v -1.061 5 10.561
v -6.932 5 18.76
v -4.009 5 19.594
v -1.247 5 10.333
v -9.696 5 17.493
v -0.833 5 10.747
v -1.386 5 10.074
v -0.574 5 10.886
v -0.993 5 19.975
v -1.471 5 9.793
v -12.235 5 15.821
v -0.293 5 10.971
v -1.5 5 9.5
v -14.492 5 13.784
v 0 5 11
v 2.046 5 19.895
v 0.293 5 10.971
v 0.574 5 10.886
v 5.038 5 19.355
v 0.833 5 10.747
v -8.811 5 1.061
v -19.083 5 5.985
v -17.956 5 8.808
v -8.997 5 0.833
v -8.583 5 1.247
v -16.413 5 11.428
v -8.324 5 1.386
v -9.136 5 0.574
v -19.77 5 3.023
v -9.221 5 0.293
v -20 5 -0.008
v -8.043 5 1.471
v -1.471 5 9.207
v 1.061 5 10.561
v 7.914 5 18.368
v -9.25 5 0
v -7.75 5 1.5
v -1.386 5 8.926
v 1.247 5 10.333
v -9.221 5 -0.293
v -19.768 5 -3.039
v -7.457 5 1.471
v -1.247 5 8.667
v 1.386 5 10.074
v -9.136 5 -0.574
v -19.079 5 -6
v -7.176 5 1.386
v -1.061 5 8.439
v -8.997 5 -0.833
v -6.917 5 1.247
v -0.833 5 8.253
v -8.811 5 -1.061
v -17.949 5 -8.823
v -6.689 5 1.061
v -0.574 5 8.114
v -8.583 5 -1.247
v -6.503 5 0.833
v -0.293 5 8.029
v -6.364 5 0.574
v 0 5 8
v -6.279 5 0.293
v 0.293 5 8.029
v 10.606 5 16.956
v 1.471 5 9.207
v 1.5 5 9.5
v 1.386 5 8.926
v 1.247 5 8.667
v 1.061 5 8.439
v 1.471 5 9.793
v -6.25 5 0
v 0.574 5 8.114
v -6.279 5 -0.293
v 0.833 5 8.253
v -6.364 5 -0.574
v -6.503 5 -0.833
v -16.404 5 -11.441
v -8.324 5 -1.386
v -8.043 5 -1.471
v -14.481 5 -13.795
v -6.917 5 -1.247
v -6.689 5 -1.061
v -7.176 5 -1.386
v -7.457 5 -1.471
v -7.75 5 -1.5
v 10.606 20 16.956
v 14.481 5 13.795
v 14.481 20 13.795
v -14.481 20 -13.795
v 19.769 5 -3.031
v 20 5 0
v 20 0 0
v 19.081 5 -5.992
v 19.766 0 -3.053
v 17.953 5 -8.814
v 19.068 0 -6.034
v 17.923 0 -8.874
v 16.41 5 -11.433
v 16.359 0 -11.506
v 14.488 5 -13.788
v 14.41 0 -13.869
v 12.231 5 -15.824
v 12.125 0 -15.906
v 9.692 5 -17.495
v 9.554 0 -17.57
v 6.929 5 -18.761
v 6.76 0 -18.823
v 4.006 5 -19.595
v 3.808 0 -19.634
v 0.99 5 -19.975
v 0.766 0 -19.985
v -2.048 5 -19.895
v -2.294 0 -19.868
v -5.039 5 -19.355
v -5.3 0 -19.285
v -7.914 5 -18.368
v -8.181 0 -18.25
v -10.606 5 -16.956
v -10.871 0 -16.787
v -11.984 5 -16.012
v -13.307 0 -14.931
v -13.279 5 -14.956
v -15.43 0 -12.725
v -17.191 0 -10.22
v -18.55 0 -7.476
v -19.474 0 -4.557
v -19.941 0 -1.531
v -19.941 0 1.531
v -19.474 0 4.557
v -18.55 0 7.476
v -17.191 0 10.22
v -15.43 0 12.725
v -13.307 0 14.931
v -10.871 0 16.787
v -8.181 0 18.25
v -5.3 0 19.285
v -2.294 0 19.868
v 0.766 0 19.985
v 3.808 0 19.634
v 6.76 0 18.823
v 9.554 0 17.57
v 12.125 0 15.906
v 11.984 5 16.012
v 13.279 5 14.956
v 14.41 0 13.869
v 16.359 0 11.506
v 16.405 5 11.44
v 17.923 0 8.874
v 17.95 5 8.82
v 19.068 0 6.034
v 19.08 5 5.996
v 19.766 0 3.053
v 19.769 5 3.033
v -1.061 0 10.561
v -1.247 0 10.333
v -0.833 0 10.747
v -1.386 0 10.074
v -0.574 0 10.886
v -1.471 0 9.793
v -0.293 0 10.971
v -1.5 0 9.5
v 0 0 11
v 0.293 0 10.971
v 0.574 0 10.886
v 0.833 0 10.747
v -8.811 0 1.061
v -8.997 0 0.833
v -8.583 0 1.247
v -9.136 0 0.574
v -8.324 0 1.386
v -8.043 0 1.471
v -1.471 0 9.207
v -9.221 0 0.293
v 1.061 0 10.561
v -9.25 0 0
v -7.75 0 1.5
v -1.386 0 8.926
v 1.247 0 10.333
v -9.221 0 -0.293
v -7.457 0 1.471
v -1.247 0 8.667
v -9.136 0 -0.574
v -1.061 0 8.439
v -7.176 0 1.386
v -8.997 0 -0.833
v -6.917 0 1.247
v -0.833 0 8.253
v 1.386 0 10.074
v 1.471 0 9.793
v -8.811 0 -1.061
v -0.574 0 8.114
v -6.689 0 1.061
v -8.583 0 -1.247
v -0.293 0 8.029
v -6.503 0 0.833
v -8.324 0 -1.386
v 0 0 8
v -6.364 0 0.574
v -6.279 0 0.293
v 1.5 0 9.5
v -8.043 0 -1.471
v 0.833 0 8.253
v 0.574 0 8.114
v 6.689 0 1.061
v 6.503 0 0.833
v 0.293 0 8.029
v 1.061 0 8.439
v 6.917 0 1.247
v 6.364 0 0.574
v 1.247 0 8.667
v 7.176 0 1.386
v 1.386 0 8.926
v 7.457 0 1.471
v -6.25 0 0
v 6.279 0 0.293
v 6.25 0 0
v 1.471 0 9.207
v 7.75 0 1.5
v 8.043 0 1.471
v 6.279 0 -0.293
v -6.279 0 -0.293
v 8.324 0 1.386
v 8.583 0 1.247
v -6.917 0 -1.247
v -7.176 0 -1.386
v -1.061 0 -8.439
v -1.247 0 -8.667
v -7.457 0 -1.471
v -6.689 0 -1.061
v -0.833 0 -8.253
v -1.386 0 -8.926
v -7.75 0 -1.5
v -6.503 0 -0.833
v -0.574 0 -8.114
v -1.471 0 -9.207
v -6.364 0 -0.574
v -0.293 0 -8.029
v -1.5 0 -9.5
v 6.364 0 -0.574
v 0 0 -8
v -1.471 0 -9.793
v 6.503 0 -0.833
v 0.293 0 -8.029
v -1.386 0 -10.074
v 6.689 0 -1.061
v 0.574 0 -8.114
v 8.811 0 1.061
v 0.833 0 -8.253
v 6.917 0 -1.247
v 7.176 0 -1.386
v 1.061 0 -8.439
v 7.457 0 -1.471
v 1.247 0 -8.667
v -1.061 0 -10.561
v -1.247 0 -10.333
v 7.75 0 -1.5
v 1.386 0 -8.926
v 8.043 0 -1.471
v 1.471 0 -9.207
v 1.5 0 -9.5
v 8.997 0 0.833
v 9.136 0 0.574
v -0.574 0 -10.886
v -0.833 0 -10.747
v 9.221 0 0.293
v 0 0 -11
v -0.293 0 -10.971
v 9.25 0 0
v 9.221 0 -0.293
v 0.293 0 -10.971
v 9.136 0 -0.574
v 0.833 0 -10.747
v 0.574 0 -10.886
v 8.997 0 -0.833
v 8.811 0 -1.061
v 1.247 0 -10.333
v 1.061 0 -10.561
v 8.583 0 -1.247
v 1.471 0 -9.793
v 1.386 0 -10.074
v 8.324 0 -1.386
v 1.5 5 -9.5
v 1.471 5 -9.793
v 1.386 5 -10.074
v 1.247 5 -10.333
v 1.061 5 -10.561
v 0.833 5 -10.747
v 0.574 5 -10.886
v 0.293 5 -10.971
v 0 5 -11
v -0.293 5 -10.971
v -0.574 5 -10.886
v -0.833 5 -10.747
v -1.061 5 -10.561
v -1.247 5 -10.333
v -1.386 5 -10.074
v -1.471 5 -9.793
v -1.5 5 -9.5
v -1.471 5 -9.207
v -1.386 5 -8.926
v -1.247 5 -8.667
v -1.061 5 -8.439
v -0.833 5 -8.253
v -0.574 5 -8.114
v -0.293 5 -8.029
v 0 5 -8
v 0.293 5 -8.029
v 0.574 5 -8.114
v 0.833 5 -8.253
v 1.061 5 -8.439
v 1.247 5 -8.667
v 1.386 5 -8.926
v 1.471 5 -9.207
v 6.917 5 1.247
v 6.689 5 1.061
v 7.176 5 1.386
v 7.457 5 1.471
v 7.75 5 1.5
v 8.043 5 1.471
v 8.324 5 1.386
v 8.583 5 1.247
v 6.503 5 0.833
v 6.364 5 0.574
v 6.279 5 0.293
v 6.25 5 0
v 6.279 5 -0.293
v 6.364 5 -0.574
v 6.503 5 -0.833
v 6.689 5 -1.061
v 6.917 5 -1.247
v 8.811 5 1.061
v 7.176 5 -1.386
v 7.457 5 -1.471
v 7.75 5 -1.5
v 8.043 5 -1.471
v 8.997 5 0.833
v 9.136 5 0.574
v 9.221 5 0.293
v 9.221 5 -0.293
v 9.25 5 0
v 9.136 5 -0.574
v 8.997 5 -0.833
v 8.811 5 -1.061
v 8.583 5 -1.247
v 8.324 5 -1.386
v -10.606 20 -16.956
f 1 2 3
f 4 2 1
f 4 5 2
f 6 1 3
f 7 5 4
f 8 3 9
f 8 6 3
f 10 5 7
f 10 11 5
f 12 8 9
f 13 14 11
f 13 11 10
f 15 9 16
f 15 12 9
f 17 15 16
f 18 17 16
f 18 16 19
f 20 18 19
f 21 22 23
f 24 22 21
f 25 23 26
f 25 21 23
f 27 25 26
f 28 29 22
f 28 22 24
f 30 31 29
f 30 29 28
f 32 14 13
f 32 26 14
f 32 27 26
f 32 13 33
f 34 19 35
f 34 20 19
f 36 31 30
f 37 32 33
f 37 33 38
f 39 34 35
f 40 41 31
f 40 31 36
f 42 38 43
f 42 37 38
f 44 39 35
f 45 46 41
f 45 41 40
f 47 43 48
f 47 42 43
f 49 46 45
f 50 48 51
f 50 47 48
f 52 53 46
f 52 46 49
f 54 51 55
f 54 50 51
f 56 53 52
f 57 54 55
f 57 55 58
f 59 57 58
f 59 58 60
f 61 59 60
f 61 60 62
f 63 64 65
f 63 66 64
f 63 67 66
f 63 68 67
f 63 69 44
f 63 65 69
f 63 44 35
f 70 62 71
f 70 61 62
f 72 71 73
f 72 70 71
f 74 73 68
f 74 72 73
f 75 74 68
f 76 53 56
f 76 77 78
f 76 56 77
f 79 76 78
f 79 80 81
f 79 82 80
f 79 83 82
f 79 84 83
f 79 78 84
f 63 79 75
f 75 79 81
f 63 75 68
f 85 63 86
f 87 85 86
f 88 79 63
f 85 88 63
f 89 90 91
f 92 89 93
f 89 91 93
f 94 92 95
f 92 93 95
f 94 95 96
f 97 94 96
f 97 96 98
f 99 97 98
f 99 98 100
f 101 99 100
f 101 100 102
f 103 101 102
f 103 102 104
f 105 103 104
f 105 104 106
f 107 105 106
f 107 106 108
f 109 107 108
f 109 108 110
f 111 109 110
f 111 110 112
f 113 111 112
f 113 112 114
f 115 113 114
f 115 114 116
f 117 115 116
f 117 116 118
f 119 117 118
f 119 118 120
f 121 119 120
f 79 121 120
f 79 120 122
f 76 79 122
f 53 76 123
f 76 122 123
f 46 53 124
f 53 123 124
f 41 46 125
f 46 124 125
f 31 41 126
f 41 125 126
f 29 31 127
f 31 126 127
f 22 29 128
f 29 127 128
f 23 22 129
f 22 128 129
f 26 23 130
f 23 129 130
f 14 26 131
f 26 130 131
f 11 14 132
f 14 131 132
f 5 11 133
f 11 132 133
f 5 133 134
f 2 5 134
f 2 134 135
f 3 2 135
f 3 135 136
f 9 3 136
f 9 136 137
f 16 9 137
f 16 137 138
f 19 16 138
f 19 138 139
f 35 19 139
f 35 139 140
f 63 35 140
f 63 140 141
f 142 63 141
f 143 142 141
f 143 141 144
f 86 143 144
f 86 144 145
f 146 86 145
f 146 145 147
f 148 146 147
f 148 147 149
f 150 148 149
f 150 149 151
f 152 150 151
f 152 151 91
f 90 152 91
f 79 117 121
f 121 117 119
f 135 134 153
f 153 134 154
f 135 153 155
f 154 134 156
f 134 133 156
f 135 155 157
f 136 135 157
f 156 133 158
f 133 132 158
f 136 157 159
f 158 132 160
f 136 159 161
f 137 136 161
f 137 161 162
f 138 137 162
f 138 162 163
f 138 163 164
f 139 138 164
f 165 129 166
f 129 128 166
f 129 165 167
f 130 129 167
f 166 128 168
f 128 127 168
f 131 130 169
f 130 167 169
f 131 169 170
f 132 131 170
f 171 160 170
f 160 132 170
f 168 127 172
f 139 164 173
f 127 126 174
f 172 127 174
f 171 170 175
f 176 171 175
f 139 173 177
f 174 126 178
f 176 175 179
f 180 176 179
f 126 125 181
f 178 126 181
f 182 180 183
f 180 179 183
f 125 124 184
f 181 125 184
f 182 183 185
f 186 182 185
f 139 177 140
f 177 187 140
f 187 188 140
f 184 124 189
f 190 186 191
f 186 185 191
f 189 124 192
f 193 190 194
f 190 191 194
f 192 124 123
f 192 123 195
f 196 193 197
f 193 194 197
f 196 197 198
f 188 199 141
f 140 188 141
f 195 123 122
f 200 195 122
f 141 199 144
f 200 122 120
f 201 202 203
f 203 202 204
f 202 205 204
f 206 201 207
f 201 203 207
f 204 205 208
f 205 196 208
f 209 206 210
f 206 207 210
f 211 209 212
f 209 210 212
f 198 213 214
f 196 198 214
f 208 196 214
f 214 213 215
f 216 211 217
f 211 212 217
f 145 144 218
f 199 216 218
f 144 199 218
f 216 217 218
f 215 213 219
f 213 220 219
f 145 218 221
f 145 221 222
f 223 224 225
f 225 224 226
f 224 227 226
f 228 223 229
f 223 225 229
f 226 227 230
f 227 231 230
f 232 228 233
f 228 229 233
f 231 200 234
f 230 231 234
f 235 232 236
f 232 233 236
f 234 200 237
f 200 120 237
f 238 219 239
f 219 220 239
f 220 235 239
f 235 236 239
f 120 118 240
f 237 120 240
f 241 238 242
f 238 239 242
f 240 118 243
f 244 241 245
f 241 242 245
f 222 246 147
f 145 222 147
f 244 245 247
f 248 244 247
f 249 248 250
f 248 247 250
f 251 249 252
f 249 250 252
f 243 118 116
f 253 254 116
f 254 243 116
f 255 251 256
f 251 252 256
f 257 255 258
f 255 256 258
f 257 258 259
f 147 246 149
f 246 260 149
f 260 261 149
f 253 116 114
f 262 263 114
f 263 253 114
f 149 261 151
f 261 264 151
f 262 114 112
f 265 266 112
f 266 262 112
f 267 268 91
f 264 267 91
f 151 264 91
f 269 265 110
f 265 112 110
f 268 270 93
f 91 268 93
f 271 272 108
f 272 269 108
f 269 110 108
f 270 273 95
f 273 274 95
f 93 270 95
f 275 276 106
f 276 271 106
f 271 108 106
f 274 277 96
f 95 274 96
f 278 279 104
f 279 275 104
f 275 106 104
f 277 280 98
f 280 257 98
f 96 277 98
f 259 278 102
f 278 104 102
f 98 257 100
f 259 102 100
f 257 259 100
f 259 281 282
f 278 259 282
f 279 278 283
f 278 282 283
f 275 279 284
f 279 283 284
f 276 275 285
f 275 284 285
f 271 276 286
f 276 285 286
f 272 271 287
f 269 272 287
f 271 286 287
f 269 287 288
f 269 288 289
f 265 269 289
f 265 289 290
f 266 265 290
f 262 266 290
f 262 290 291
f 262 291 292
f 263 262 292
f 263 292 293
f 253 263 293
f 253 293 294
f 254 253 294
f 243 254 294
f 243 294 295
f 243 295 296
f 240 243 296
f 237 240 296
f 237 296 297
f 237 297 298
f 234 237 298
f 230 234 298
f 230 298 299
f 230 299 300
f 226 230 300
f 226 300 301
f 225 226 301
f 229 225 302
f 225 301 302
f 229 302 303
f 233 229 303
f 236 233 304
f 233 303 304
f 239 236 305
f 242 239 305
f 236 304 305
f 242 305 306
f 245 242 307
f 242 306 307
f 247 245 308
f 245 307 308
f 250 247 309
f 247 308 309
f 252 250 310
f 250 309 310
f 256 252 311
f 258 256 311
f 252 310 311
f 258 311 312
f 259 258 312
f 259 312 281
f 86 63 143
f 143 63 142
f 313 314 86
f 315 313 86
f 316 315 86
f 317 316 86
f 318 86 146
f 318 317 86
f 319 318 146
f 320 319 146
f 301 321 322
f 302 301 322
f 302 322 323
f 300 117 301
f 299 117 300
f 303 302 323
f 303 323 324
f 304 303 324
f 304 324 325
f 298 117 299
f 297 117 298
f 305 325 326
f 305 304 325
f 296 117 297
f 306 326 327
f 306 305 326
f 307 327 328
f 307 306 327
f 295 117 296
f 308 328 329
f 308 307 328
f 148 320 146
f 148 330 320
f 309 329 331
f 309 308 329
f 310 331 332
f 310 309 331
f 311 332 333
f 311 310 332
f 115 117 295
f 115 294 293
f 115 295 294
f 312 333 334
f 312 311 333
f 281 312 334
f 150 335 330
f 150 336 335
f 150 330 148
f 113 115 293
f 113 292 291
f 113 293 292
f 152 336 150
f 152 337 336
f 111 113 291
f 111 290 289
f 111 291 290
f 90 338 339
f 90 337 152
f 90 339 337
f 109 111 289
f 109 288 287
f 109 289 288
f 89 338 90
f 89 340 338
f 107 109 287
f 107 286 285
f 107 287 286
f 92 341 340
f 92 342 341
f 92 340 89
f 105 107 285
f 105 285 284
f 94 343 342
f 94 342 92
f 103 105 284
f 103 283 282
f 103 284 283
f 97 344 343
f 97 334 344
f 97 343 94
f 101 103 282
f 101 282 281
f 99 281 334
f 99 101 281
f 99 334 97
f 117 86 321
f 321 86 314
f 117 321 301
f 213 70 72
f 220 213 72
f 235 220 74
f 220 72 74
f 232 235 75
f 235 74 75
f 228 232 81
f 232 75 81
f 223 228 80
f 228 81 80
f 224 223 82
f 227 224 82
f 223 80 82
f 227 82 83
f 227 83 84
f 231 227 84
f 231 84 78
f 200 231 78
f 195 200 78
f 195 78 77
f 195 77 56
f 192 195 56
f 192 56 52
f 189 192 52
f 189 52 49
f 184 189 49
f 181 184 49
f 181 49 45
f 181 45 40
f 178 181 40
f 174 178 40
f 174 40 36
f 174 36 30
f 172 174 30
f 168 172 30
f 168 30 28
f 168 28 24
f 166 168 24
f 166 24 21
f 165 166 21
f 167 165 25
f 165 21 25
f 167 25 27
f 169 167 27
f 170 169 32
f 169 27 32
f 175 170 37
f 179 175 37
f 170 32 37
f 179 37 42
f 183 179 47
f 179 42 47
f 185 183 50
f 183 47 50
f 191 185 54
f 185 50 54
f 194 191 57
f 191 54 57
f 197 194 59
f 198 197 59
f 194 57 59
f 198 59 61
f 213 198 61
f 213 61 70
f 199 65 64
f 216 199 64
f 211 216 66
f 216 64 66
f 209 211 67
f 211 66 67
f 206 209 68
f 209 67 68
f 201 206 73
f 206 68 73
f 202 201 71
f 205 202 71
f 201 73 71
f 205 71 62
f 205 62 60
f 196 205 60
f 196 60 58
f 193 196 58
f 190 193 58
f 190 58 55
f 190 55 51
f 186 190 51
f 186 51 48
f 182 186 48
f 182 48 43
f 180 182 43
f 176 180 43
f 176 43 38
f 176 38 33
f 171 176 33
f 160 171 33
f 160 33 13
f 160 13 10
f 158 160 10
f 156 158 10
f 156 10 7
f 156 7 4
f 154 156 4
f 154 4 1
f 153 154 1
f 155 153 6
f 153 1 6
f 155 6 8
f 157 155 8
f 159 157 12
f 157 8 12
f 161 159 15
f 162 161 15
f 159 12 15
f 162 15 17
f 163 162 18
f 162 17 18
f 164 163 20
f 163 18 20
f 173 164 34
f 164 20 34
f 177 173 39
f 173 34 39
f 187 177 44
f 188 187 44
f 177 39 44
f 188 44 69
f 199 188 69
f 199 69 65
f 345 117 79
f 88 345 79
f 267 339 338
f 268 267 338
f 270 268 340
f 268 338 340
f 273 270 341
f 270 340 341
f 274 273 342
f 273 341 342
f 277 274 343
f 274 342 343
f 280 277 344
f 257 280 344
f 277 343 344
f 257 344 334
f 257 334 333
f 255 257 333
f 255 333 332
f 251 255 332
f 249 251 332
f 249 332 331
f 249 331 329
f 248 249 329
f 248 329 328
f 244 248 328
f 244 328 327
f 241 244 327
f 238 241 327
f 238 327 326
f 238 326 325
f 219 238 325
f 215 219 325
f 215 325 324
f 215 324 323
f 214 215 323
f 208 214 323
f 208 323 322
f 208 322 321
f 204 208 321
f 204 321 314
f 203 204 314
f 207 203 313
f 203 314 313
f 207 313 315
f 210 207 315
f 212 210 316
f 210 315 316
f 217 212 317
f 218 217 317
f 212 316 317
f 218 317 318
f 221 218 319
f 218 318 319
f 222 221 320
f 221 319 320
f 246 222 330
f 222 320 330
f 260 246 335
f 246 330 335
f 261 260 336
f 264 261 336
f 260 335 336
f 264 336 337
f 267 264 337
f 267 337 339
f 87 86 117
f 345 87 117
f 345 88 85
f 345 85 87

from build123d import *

# Parameters (mm, degrees)
SKETCH1_R           = 20
BOSS_EXTRUDE1_DEPTH = 5
CUT_EXTRUDE1_REACH  = 7
SKETCH2_R           = 1.5
BOSS_EXTRUDE2_DEPTH = 15


with BuildPart() as part:
    # Sketch1 → Boss-Extrude1 (new body)
    with BuildSketch(Plane(origin=(0, 0, 0), x_dir=(1, 0, 0), z_dir=(0, 1, 0))):
        Circle(SKETCH1_R)
    extrude(amount=BOSS_EXTRUDE1_DEPTH)

    # Sketch2 → Cut-Extrude1 (cut, up to next)
    with BuildSketch(Plane(origin=(0, 5, 0), x_dir=(1, 0, 0), z_dir=(0, 1, 0)), mode=Mode.PRIVATE) as cut_extrude1_sk1:
        with Locations((0, 9.5)):
            Circle(SKETCH2_R)
    cut_extrude1_tool1 = extrude(cut_extrude1_sk1.sketch, amount=-CUT_EXTRUDE1_REACH, mode=Mode.PRIVATE) & part.part
    add(cut_extrude1_tool1.solids().sort_by_distance((0, 5, -9.5))[0], mode=Mode.SUBTRACT)
    # Sketch2 → Cut-Extrude1 (cut, up to next)
    with BuildSketch(Plane(origin=(0, 5, 0), x_dir=(1, 0, 0), z_dir=(0, 1, 0)), mode=Mode.PRIVATE) as cut_extrude1_sk2:
        with Locations((0, -9.5)):
            Circle(SKETCH2_R)
    cut_extrude1_tool2 = extrude(cut_extrude1_sk2.sketch, amount=-CUT_EXTRUDE1_REACH, mode=Mode.PRIVATE) & part.part
    add(cut_extrude1_tool2.solids().sort_by_distance((0, 5, 9.5))[0], mode=Mode.SUBTRACT)
    # Sketch2 → Cut-Extrude1 (cut, up to next)
    with BuildSketch(Plane(origin=(0, 5, 0), x_dir=(1, 0, 0), z_dir=(0, 1, 0)), mode=Mode.PRIVATE) as cut_extrude1_sk3:
        with Locations((-7.75, 0)):
            Circle(SKETCH2_R)
    cut_extrude1_tool3 = extrude(cut_extrude1_sk3.sketch, amount=-CUT_EXTRUDE1_REACH, mode=Mode.PRIVATE) & part.part
    add(cut_extrude1_tool3.solids().sort_by_distance((-7.75, 5, 0))[0], mode=Mode.SUBTRACT)
    # Sketch2 → Cut-Extrude1 (cut, up to next)
    with BuildSketch(Plane(origin=(0, 5, 0), x_dir=(1, 0, 0), z_dir=(0, 1, 0)), mode=Mode.PRIVATE) as cut_extrude1_sk4:
        with Locations((7.75, 0)):
            Circle(SKETCH2_R)
    cut_extrude1_tool4 = extrude(cut_extrude1_sk4.sketch, amount=-CUT_EXTRUDE1_REACH, mode=Mode.PRIVATE) & part.part
    add(cut_extrude1_tool4.solids().sort_by_distance((7.75, 5, 0))[0], mode=Mode.SUBTRACT)

    # Sketch3 → Boss-Extrude2 (add)
    with BuildSketch(Plane(origin=(0, 5, 0), x_dir=(1, 0, 0), z_dir=(0, 1, 0))):
        Polygon((-14.480538437, 13.795434266), (10.606213333, -16.956067903), (14.480538437, -13.795434266), (-10.606213333, 16.956067903), align=None)
    extrude(amount=BOSS_EXTRUDE2_DEPTH)


solid = part.part
